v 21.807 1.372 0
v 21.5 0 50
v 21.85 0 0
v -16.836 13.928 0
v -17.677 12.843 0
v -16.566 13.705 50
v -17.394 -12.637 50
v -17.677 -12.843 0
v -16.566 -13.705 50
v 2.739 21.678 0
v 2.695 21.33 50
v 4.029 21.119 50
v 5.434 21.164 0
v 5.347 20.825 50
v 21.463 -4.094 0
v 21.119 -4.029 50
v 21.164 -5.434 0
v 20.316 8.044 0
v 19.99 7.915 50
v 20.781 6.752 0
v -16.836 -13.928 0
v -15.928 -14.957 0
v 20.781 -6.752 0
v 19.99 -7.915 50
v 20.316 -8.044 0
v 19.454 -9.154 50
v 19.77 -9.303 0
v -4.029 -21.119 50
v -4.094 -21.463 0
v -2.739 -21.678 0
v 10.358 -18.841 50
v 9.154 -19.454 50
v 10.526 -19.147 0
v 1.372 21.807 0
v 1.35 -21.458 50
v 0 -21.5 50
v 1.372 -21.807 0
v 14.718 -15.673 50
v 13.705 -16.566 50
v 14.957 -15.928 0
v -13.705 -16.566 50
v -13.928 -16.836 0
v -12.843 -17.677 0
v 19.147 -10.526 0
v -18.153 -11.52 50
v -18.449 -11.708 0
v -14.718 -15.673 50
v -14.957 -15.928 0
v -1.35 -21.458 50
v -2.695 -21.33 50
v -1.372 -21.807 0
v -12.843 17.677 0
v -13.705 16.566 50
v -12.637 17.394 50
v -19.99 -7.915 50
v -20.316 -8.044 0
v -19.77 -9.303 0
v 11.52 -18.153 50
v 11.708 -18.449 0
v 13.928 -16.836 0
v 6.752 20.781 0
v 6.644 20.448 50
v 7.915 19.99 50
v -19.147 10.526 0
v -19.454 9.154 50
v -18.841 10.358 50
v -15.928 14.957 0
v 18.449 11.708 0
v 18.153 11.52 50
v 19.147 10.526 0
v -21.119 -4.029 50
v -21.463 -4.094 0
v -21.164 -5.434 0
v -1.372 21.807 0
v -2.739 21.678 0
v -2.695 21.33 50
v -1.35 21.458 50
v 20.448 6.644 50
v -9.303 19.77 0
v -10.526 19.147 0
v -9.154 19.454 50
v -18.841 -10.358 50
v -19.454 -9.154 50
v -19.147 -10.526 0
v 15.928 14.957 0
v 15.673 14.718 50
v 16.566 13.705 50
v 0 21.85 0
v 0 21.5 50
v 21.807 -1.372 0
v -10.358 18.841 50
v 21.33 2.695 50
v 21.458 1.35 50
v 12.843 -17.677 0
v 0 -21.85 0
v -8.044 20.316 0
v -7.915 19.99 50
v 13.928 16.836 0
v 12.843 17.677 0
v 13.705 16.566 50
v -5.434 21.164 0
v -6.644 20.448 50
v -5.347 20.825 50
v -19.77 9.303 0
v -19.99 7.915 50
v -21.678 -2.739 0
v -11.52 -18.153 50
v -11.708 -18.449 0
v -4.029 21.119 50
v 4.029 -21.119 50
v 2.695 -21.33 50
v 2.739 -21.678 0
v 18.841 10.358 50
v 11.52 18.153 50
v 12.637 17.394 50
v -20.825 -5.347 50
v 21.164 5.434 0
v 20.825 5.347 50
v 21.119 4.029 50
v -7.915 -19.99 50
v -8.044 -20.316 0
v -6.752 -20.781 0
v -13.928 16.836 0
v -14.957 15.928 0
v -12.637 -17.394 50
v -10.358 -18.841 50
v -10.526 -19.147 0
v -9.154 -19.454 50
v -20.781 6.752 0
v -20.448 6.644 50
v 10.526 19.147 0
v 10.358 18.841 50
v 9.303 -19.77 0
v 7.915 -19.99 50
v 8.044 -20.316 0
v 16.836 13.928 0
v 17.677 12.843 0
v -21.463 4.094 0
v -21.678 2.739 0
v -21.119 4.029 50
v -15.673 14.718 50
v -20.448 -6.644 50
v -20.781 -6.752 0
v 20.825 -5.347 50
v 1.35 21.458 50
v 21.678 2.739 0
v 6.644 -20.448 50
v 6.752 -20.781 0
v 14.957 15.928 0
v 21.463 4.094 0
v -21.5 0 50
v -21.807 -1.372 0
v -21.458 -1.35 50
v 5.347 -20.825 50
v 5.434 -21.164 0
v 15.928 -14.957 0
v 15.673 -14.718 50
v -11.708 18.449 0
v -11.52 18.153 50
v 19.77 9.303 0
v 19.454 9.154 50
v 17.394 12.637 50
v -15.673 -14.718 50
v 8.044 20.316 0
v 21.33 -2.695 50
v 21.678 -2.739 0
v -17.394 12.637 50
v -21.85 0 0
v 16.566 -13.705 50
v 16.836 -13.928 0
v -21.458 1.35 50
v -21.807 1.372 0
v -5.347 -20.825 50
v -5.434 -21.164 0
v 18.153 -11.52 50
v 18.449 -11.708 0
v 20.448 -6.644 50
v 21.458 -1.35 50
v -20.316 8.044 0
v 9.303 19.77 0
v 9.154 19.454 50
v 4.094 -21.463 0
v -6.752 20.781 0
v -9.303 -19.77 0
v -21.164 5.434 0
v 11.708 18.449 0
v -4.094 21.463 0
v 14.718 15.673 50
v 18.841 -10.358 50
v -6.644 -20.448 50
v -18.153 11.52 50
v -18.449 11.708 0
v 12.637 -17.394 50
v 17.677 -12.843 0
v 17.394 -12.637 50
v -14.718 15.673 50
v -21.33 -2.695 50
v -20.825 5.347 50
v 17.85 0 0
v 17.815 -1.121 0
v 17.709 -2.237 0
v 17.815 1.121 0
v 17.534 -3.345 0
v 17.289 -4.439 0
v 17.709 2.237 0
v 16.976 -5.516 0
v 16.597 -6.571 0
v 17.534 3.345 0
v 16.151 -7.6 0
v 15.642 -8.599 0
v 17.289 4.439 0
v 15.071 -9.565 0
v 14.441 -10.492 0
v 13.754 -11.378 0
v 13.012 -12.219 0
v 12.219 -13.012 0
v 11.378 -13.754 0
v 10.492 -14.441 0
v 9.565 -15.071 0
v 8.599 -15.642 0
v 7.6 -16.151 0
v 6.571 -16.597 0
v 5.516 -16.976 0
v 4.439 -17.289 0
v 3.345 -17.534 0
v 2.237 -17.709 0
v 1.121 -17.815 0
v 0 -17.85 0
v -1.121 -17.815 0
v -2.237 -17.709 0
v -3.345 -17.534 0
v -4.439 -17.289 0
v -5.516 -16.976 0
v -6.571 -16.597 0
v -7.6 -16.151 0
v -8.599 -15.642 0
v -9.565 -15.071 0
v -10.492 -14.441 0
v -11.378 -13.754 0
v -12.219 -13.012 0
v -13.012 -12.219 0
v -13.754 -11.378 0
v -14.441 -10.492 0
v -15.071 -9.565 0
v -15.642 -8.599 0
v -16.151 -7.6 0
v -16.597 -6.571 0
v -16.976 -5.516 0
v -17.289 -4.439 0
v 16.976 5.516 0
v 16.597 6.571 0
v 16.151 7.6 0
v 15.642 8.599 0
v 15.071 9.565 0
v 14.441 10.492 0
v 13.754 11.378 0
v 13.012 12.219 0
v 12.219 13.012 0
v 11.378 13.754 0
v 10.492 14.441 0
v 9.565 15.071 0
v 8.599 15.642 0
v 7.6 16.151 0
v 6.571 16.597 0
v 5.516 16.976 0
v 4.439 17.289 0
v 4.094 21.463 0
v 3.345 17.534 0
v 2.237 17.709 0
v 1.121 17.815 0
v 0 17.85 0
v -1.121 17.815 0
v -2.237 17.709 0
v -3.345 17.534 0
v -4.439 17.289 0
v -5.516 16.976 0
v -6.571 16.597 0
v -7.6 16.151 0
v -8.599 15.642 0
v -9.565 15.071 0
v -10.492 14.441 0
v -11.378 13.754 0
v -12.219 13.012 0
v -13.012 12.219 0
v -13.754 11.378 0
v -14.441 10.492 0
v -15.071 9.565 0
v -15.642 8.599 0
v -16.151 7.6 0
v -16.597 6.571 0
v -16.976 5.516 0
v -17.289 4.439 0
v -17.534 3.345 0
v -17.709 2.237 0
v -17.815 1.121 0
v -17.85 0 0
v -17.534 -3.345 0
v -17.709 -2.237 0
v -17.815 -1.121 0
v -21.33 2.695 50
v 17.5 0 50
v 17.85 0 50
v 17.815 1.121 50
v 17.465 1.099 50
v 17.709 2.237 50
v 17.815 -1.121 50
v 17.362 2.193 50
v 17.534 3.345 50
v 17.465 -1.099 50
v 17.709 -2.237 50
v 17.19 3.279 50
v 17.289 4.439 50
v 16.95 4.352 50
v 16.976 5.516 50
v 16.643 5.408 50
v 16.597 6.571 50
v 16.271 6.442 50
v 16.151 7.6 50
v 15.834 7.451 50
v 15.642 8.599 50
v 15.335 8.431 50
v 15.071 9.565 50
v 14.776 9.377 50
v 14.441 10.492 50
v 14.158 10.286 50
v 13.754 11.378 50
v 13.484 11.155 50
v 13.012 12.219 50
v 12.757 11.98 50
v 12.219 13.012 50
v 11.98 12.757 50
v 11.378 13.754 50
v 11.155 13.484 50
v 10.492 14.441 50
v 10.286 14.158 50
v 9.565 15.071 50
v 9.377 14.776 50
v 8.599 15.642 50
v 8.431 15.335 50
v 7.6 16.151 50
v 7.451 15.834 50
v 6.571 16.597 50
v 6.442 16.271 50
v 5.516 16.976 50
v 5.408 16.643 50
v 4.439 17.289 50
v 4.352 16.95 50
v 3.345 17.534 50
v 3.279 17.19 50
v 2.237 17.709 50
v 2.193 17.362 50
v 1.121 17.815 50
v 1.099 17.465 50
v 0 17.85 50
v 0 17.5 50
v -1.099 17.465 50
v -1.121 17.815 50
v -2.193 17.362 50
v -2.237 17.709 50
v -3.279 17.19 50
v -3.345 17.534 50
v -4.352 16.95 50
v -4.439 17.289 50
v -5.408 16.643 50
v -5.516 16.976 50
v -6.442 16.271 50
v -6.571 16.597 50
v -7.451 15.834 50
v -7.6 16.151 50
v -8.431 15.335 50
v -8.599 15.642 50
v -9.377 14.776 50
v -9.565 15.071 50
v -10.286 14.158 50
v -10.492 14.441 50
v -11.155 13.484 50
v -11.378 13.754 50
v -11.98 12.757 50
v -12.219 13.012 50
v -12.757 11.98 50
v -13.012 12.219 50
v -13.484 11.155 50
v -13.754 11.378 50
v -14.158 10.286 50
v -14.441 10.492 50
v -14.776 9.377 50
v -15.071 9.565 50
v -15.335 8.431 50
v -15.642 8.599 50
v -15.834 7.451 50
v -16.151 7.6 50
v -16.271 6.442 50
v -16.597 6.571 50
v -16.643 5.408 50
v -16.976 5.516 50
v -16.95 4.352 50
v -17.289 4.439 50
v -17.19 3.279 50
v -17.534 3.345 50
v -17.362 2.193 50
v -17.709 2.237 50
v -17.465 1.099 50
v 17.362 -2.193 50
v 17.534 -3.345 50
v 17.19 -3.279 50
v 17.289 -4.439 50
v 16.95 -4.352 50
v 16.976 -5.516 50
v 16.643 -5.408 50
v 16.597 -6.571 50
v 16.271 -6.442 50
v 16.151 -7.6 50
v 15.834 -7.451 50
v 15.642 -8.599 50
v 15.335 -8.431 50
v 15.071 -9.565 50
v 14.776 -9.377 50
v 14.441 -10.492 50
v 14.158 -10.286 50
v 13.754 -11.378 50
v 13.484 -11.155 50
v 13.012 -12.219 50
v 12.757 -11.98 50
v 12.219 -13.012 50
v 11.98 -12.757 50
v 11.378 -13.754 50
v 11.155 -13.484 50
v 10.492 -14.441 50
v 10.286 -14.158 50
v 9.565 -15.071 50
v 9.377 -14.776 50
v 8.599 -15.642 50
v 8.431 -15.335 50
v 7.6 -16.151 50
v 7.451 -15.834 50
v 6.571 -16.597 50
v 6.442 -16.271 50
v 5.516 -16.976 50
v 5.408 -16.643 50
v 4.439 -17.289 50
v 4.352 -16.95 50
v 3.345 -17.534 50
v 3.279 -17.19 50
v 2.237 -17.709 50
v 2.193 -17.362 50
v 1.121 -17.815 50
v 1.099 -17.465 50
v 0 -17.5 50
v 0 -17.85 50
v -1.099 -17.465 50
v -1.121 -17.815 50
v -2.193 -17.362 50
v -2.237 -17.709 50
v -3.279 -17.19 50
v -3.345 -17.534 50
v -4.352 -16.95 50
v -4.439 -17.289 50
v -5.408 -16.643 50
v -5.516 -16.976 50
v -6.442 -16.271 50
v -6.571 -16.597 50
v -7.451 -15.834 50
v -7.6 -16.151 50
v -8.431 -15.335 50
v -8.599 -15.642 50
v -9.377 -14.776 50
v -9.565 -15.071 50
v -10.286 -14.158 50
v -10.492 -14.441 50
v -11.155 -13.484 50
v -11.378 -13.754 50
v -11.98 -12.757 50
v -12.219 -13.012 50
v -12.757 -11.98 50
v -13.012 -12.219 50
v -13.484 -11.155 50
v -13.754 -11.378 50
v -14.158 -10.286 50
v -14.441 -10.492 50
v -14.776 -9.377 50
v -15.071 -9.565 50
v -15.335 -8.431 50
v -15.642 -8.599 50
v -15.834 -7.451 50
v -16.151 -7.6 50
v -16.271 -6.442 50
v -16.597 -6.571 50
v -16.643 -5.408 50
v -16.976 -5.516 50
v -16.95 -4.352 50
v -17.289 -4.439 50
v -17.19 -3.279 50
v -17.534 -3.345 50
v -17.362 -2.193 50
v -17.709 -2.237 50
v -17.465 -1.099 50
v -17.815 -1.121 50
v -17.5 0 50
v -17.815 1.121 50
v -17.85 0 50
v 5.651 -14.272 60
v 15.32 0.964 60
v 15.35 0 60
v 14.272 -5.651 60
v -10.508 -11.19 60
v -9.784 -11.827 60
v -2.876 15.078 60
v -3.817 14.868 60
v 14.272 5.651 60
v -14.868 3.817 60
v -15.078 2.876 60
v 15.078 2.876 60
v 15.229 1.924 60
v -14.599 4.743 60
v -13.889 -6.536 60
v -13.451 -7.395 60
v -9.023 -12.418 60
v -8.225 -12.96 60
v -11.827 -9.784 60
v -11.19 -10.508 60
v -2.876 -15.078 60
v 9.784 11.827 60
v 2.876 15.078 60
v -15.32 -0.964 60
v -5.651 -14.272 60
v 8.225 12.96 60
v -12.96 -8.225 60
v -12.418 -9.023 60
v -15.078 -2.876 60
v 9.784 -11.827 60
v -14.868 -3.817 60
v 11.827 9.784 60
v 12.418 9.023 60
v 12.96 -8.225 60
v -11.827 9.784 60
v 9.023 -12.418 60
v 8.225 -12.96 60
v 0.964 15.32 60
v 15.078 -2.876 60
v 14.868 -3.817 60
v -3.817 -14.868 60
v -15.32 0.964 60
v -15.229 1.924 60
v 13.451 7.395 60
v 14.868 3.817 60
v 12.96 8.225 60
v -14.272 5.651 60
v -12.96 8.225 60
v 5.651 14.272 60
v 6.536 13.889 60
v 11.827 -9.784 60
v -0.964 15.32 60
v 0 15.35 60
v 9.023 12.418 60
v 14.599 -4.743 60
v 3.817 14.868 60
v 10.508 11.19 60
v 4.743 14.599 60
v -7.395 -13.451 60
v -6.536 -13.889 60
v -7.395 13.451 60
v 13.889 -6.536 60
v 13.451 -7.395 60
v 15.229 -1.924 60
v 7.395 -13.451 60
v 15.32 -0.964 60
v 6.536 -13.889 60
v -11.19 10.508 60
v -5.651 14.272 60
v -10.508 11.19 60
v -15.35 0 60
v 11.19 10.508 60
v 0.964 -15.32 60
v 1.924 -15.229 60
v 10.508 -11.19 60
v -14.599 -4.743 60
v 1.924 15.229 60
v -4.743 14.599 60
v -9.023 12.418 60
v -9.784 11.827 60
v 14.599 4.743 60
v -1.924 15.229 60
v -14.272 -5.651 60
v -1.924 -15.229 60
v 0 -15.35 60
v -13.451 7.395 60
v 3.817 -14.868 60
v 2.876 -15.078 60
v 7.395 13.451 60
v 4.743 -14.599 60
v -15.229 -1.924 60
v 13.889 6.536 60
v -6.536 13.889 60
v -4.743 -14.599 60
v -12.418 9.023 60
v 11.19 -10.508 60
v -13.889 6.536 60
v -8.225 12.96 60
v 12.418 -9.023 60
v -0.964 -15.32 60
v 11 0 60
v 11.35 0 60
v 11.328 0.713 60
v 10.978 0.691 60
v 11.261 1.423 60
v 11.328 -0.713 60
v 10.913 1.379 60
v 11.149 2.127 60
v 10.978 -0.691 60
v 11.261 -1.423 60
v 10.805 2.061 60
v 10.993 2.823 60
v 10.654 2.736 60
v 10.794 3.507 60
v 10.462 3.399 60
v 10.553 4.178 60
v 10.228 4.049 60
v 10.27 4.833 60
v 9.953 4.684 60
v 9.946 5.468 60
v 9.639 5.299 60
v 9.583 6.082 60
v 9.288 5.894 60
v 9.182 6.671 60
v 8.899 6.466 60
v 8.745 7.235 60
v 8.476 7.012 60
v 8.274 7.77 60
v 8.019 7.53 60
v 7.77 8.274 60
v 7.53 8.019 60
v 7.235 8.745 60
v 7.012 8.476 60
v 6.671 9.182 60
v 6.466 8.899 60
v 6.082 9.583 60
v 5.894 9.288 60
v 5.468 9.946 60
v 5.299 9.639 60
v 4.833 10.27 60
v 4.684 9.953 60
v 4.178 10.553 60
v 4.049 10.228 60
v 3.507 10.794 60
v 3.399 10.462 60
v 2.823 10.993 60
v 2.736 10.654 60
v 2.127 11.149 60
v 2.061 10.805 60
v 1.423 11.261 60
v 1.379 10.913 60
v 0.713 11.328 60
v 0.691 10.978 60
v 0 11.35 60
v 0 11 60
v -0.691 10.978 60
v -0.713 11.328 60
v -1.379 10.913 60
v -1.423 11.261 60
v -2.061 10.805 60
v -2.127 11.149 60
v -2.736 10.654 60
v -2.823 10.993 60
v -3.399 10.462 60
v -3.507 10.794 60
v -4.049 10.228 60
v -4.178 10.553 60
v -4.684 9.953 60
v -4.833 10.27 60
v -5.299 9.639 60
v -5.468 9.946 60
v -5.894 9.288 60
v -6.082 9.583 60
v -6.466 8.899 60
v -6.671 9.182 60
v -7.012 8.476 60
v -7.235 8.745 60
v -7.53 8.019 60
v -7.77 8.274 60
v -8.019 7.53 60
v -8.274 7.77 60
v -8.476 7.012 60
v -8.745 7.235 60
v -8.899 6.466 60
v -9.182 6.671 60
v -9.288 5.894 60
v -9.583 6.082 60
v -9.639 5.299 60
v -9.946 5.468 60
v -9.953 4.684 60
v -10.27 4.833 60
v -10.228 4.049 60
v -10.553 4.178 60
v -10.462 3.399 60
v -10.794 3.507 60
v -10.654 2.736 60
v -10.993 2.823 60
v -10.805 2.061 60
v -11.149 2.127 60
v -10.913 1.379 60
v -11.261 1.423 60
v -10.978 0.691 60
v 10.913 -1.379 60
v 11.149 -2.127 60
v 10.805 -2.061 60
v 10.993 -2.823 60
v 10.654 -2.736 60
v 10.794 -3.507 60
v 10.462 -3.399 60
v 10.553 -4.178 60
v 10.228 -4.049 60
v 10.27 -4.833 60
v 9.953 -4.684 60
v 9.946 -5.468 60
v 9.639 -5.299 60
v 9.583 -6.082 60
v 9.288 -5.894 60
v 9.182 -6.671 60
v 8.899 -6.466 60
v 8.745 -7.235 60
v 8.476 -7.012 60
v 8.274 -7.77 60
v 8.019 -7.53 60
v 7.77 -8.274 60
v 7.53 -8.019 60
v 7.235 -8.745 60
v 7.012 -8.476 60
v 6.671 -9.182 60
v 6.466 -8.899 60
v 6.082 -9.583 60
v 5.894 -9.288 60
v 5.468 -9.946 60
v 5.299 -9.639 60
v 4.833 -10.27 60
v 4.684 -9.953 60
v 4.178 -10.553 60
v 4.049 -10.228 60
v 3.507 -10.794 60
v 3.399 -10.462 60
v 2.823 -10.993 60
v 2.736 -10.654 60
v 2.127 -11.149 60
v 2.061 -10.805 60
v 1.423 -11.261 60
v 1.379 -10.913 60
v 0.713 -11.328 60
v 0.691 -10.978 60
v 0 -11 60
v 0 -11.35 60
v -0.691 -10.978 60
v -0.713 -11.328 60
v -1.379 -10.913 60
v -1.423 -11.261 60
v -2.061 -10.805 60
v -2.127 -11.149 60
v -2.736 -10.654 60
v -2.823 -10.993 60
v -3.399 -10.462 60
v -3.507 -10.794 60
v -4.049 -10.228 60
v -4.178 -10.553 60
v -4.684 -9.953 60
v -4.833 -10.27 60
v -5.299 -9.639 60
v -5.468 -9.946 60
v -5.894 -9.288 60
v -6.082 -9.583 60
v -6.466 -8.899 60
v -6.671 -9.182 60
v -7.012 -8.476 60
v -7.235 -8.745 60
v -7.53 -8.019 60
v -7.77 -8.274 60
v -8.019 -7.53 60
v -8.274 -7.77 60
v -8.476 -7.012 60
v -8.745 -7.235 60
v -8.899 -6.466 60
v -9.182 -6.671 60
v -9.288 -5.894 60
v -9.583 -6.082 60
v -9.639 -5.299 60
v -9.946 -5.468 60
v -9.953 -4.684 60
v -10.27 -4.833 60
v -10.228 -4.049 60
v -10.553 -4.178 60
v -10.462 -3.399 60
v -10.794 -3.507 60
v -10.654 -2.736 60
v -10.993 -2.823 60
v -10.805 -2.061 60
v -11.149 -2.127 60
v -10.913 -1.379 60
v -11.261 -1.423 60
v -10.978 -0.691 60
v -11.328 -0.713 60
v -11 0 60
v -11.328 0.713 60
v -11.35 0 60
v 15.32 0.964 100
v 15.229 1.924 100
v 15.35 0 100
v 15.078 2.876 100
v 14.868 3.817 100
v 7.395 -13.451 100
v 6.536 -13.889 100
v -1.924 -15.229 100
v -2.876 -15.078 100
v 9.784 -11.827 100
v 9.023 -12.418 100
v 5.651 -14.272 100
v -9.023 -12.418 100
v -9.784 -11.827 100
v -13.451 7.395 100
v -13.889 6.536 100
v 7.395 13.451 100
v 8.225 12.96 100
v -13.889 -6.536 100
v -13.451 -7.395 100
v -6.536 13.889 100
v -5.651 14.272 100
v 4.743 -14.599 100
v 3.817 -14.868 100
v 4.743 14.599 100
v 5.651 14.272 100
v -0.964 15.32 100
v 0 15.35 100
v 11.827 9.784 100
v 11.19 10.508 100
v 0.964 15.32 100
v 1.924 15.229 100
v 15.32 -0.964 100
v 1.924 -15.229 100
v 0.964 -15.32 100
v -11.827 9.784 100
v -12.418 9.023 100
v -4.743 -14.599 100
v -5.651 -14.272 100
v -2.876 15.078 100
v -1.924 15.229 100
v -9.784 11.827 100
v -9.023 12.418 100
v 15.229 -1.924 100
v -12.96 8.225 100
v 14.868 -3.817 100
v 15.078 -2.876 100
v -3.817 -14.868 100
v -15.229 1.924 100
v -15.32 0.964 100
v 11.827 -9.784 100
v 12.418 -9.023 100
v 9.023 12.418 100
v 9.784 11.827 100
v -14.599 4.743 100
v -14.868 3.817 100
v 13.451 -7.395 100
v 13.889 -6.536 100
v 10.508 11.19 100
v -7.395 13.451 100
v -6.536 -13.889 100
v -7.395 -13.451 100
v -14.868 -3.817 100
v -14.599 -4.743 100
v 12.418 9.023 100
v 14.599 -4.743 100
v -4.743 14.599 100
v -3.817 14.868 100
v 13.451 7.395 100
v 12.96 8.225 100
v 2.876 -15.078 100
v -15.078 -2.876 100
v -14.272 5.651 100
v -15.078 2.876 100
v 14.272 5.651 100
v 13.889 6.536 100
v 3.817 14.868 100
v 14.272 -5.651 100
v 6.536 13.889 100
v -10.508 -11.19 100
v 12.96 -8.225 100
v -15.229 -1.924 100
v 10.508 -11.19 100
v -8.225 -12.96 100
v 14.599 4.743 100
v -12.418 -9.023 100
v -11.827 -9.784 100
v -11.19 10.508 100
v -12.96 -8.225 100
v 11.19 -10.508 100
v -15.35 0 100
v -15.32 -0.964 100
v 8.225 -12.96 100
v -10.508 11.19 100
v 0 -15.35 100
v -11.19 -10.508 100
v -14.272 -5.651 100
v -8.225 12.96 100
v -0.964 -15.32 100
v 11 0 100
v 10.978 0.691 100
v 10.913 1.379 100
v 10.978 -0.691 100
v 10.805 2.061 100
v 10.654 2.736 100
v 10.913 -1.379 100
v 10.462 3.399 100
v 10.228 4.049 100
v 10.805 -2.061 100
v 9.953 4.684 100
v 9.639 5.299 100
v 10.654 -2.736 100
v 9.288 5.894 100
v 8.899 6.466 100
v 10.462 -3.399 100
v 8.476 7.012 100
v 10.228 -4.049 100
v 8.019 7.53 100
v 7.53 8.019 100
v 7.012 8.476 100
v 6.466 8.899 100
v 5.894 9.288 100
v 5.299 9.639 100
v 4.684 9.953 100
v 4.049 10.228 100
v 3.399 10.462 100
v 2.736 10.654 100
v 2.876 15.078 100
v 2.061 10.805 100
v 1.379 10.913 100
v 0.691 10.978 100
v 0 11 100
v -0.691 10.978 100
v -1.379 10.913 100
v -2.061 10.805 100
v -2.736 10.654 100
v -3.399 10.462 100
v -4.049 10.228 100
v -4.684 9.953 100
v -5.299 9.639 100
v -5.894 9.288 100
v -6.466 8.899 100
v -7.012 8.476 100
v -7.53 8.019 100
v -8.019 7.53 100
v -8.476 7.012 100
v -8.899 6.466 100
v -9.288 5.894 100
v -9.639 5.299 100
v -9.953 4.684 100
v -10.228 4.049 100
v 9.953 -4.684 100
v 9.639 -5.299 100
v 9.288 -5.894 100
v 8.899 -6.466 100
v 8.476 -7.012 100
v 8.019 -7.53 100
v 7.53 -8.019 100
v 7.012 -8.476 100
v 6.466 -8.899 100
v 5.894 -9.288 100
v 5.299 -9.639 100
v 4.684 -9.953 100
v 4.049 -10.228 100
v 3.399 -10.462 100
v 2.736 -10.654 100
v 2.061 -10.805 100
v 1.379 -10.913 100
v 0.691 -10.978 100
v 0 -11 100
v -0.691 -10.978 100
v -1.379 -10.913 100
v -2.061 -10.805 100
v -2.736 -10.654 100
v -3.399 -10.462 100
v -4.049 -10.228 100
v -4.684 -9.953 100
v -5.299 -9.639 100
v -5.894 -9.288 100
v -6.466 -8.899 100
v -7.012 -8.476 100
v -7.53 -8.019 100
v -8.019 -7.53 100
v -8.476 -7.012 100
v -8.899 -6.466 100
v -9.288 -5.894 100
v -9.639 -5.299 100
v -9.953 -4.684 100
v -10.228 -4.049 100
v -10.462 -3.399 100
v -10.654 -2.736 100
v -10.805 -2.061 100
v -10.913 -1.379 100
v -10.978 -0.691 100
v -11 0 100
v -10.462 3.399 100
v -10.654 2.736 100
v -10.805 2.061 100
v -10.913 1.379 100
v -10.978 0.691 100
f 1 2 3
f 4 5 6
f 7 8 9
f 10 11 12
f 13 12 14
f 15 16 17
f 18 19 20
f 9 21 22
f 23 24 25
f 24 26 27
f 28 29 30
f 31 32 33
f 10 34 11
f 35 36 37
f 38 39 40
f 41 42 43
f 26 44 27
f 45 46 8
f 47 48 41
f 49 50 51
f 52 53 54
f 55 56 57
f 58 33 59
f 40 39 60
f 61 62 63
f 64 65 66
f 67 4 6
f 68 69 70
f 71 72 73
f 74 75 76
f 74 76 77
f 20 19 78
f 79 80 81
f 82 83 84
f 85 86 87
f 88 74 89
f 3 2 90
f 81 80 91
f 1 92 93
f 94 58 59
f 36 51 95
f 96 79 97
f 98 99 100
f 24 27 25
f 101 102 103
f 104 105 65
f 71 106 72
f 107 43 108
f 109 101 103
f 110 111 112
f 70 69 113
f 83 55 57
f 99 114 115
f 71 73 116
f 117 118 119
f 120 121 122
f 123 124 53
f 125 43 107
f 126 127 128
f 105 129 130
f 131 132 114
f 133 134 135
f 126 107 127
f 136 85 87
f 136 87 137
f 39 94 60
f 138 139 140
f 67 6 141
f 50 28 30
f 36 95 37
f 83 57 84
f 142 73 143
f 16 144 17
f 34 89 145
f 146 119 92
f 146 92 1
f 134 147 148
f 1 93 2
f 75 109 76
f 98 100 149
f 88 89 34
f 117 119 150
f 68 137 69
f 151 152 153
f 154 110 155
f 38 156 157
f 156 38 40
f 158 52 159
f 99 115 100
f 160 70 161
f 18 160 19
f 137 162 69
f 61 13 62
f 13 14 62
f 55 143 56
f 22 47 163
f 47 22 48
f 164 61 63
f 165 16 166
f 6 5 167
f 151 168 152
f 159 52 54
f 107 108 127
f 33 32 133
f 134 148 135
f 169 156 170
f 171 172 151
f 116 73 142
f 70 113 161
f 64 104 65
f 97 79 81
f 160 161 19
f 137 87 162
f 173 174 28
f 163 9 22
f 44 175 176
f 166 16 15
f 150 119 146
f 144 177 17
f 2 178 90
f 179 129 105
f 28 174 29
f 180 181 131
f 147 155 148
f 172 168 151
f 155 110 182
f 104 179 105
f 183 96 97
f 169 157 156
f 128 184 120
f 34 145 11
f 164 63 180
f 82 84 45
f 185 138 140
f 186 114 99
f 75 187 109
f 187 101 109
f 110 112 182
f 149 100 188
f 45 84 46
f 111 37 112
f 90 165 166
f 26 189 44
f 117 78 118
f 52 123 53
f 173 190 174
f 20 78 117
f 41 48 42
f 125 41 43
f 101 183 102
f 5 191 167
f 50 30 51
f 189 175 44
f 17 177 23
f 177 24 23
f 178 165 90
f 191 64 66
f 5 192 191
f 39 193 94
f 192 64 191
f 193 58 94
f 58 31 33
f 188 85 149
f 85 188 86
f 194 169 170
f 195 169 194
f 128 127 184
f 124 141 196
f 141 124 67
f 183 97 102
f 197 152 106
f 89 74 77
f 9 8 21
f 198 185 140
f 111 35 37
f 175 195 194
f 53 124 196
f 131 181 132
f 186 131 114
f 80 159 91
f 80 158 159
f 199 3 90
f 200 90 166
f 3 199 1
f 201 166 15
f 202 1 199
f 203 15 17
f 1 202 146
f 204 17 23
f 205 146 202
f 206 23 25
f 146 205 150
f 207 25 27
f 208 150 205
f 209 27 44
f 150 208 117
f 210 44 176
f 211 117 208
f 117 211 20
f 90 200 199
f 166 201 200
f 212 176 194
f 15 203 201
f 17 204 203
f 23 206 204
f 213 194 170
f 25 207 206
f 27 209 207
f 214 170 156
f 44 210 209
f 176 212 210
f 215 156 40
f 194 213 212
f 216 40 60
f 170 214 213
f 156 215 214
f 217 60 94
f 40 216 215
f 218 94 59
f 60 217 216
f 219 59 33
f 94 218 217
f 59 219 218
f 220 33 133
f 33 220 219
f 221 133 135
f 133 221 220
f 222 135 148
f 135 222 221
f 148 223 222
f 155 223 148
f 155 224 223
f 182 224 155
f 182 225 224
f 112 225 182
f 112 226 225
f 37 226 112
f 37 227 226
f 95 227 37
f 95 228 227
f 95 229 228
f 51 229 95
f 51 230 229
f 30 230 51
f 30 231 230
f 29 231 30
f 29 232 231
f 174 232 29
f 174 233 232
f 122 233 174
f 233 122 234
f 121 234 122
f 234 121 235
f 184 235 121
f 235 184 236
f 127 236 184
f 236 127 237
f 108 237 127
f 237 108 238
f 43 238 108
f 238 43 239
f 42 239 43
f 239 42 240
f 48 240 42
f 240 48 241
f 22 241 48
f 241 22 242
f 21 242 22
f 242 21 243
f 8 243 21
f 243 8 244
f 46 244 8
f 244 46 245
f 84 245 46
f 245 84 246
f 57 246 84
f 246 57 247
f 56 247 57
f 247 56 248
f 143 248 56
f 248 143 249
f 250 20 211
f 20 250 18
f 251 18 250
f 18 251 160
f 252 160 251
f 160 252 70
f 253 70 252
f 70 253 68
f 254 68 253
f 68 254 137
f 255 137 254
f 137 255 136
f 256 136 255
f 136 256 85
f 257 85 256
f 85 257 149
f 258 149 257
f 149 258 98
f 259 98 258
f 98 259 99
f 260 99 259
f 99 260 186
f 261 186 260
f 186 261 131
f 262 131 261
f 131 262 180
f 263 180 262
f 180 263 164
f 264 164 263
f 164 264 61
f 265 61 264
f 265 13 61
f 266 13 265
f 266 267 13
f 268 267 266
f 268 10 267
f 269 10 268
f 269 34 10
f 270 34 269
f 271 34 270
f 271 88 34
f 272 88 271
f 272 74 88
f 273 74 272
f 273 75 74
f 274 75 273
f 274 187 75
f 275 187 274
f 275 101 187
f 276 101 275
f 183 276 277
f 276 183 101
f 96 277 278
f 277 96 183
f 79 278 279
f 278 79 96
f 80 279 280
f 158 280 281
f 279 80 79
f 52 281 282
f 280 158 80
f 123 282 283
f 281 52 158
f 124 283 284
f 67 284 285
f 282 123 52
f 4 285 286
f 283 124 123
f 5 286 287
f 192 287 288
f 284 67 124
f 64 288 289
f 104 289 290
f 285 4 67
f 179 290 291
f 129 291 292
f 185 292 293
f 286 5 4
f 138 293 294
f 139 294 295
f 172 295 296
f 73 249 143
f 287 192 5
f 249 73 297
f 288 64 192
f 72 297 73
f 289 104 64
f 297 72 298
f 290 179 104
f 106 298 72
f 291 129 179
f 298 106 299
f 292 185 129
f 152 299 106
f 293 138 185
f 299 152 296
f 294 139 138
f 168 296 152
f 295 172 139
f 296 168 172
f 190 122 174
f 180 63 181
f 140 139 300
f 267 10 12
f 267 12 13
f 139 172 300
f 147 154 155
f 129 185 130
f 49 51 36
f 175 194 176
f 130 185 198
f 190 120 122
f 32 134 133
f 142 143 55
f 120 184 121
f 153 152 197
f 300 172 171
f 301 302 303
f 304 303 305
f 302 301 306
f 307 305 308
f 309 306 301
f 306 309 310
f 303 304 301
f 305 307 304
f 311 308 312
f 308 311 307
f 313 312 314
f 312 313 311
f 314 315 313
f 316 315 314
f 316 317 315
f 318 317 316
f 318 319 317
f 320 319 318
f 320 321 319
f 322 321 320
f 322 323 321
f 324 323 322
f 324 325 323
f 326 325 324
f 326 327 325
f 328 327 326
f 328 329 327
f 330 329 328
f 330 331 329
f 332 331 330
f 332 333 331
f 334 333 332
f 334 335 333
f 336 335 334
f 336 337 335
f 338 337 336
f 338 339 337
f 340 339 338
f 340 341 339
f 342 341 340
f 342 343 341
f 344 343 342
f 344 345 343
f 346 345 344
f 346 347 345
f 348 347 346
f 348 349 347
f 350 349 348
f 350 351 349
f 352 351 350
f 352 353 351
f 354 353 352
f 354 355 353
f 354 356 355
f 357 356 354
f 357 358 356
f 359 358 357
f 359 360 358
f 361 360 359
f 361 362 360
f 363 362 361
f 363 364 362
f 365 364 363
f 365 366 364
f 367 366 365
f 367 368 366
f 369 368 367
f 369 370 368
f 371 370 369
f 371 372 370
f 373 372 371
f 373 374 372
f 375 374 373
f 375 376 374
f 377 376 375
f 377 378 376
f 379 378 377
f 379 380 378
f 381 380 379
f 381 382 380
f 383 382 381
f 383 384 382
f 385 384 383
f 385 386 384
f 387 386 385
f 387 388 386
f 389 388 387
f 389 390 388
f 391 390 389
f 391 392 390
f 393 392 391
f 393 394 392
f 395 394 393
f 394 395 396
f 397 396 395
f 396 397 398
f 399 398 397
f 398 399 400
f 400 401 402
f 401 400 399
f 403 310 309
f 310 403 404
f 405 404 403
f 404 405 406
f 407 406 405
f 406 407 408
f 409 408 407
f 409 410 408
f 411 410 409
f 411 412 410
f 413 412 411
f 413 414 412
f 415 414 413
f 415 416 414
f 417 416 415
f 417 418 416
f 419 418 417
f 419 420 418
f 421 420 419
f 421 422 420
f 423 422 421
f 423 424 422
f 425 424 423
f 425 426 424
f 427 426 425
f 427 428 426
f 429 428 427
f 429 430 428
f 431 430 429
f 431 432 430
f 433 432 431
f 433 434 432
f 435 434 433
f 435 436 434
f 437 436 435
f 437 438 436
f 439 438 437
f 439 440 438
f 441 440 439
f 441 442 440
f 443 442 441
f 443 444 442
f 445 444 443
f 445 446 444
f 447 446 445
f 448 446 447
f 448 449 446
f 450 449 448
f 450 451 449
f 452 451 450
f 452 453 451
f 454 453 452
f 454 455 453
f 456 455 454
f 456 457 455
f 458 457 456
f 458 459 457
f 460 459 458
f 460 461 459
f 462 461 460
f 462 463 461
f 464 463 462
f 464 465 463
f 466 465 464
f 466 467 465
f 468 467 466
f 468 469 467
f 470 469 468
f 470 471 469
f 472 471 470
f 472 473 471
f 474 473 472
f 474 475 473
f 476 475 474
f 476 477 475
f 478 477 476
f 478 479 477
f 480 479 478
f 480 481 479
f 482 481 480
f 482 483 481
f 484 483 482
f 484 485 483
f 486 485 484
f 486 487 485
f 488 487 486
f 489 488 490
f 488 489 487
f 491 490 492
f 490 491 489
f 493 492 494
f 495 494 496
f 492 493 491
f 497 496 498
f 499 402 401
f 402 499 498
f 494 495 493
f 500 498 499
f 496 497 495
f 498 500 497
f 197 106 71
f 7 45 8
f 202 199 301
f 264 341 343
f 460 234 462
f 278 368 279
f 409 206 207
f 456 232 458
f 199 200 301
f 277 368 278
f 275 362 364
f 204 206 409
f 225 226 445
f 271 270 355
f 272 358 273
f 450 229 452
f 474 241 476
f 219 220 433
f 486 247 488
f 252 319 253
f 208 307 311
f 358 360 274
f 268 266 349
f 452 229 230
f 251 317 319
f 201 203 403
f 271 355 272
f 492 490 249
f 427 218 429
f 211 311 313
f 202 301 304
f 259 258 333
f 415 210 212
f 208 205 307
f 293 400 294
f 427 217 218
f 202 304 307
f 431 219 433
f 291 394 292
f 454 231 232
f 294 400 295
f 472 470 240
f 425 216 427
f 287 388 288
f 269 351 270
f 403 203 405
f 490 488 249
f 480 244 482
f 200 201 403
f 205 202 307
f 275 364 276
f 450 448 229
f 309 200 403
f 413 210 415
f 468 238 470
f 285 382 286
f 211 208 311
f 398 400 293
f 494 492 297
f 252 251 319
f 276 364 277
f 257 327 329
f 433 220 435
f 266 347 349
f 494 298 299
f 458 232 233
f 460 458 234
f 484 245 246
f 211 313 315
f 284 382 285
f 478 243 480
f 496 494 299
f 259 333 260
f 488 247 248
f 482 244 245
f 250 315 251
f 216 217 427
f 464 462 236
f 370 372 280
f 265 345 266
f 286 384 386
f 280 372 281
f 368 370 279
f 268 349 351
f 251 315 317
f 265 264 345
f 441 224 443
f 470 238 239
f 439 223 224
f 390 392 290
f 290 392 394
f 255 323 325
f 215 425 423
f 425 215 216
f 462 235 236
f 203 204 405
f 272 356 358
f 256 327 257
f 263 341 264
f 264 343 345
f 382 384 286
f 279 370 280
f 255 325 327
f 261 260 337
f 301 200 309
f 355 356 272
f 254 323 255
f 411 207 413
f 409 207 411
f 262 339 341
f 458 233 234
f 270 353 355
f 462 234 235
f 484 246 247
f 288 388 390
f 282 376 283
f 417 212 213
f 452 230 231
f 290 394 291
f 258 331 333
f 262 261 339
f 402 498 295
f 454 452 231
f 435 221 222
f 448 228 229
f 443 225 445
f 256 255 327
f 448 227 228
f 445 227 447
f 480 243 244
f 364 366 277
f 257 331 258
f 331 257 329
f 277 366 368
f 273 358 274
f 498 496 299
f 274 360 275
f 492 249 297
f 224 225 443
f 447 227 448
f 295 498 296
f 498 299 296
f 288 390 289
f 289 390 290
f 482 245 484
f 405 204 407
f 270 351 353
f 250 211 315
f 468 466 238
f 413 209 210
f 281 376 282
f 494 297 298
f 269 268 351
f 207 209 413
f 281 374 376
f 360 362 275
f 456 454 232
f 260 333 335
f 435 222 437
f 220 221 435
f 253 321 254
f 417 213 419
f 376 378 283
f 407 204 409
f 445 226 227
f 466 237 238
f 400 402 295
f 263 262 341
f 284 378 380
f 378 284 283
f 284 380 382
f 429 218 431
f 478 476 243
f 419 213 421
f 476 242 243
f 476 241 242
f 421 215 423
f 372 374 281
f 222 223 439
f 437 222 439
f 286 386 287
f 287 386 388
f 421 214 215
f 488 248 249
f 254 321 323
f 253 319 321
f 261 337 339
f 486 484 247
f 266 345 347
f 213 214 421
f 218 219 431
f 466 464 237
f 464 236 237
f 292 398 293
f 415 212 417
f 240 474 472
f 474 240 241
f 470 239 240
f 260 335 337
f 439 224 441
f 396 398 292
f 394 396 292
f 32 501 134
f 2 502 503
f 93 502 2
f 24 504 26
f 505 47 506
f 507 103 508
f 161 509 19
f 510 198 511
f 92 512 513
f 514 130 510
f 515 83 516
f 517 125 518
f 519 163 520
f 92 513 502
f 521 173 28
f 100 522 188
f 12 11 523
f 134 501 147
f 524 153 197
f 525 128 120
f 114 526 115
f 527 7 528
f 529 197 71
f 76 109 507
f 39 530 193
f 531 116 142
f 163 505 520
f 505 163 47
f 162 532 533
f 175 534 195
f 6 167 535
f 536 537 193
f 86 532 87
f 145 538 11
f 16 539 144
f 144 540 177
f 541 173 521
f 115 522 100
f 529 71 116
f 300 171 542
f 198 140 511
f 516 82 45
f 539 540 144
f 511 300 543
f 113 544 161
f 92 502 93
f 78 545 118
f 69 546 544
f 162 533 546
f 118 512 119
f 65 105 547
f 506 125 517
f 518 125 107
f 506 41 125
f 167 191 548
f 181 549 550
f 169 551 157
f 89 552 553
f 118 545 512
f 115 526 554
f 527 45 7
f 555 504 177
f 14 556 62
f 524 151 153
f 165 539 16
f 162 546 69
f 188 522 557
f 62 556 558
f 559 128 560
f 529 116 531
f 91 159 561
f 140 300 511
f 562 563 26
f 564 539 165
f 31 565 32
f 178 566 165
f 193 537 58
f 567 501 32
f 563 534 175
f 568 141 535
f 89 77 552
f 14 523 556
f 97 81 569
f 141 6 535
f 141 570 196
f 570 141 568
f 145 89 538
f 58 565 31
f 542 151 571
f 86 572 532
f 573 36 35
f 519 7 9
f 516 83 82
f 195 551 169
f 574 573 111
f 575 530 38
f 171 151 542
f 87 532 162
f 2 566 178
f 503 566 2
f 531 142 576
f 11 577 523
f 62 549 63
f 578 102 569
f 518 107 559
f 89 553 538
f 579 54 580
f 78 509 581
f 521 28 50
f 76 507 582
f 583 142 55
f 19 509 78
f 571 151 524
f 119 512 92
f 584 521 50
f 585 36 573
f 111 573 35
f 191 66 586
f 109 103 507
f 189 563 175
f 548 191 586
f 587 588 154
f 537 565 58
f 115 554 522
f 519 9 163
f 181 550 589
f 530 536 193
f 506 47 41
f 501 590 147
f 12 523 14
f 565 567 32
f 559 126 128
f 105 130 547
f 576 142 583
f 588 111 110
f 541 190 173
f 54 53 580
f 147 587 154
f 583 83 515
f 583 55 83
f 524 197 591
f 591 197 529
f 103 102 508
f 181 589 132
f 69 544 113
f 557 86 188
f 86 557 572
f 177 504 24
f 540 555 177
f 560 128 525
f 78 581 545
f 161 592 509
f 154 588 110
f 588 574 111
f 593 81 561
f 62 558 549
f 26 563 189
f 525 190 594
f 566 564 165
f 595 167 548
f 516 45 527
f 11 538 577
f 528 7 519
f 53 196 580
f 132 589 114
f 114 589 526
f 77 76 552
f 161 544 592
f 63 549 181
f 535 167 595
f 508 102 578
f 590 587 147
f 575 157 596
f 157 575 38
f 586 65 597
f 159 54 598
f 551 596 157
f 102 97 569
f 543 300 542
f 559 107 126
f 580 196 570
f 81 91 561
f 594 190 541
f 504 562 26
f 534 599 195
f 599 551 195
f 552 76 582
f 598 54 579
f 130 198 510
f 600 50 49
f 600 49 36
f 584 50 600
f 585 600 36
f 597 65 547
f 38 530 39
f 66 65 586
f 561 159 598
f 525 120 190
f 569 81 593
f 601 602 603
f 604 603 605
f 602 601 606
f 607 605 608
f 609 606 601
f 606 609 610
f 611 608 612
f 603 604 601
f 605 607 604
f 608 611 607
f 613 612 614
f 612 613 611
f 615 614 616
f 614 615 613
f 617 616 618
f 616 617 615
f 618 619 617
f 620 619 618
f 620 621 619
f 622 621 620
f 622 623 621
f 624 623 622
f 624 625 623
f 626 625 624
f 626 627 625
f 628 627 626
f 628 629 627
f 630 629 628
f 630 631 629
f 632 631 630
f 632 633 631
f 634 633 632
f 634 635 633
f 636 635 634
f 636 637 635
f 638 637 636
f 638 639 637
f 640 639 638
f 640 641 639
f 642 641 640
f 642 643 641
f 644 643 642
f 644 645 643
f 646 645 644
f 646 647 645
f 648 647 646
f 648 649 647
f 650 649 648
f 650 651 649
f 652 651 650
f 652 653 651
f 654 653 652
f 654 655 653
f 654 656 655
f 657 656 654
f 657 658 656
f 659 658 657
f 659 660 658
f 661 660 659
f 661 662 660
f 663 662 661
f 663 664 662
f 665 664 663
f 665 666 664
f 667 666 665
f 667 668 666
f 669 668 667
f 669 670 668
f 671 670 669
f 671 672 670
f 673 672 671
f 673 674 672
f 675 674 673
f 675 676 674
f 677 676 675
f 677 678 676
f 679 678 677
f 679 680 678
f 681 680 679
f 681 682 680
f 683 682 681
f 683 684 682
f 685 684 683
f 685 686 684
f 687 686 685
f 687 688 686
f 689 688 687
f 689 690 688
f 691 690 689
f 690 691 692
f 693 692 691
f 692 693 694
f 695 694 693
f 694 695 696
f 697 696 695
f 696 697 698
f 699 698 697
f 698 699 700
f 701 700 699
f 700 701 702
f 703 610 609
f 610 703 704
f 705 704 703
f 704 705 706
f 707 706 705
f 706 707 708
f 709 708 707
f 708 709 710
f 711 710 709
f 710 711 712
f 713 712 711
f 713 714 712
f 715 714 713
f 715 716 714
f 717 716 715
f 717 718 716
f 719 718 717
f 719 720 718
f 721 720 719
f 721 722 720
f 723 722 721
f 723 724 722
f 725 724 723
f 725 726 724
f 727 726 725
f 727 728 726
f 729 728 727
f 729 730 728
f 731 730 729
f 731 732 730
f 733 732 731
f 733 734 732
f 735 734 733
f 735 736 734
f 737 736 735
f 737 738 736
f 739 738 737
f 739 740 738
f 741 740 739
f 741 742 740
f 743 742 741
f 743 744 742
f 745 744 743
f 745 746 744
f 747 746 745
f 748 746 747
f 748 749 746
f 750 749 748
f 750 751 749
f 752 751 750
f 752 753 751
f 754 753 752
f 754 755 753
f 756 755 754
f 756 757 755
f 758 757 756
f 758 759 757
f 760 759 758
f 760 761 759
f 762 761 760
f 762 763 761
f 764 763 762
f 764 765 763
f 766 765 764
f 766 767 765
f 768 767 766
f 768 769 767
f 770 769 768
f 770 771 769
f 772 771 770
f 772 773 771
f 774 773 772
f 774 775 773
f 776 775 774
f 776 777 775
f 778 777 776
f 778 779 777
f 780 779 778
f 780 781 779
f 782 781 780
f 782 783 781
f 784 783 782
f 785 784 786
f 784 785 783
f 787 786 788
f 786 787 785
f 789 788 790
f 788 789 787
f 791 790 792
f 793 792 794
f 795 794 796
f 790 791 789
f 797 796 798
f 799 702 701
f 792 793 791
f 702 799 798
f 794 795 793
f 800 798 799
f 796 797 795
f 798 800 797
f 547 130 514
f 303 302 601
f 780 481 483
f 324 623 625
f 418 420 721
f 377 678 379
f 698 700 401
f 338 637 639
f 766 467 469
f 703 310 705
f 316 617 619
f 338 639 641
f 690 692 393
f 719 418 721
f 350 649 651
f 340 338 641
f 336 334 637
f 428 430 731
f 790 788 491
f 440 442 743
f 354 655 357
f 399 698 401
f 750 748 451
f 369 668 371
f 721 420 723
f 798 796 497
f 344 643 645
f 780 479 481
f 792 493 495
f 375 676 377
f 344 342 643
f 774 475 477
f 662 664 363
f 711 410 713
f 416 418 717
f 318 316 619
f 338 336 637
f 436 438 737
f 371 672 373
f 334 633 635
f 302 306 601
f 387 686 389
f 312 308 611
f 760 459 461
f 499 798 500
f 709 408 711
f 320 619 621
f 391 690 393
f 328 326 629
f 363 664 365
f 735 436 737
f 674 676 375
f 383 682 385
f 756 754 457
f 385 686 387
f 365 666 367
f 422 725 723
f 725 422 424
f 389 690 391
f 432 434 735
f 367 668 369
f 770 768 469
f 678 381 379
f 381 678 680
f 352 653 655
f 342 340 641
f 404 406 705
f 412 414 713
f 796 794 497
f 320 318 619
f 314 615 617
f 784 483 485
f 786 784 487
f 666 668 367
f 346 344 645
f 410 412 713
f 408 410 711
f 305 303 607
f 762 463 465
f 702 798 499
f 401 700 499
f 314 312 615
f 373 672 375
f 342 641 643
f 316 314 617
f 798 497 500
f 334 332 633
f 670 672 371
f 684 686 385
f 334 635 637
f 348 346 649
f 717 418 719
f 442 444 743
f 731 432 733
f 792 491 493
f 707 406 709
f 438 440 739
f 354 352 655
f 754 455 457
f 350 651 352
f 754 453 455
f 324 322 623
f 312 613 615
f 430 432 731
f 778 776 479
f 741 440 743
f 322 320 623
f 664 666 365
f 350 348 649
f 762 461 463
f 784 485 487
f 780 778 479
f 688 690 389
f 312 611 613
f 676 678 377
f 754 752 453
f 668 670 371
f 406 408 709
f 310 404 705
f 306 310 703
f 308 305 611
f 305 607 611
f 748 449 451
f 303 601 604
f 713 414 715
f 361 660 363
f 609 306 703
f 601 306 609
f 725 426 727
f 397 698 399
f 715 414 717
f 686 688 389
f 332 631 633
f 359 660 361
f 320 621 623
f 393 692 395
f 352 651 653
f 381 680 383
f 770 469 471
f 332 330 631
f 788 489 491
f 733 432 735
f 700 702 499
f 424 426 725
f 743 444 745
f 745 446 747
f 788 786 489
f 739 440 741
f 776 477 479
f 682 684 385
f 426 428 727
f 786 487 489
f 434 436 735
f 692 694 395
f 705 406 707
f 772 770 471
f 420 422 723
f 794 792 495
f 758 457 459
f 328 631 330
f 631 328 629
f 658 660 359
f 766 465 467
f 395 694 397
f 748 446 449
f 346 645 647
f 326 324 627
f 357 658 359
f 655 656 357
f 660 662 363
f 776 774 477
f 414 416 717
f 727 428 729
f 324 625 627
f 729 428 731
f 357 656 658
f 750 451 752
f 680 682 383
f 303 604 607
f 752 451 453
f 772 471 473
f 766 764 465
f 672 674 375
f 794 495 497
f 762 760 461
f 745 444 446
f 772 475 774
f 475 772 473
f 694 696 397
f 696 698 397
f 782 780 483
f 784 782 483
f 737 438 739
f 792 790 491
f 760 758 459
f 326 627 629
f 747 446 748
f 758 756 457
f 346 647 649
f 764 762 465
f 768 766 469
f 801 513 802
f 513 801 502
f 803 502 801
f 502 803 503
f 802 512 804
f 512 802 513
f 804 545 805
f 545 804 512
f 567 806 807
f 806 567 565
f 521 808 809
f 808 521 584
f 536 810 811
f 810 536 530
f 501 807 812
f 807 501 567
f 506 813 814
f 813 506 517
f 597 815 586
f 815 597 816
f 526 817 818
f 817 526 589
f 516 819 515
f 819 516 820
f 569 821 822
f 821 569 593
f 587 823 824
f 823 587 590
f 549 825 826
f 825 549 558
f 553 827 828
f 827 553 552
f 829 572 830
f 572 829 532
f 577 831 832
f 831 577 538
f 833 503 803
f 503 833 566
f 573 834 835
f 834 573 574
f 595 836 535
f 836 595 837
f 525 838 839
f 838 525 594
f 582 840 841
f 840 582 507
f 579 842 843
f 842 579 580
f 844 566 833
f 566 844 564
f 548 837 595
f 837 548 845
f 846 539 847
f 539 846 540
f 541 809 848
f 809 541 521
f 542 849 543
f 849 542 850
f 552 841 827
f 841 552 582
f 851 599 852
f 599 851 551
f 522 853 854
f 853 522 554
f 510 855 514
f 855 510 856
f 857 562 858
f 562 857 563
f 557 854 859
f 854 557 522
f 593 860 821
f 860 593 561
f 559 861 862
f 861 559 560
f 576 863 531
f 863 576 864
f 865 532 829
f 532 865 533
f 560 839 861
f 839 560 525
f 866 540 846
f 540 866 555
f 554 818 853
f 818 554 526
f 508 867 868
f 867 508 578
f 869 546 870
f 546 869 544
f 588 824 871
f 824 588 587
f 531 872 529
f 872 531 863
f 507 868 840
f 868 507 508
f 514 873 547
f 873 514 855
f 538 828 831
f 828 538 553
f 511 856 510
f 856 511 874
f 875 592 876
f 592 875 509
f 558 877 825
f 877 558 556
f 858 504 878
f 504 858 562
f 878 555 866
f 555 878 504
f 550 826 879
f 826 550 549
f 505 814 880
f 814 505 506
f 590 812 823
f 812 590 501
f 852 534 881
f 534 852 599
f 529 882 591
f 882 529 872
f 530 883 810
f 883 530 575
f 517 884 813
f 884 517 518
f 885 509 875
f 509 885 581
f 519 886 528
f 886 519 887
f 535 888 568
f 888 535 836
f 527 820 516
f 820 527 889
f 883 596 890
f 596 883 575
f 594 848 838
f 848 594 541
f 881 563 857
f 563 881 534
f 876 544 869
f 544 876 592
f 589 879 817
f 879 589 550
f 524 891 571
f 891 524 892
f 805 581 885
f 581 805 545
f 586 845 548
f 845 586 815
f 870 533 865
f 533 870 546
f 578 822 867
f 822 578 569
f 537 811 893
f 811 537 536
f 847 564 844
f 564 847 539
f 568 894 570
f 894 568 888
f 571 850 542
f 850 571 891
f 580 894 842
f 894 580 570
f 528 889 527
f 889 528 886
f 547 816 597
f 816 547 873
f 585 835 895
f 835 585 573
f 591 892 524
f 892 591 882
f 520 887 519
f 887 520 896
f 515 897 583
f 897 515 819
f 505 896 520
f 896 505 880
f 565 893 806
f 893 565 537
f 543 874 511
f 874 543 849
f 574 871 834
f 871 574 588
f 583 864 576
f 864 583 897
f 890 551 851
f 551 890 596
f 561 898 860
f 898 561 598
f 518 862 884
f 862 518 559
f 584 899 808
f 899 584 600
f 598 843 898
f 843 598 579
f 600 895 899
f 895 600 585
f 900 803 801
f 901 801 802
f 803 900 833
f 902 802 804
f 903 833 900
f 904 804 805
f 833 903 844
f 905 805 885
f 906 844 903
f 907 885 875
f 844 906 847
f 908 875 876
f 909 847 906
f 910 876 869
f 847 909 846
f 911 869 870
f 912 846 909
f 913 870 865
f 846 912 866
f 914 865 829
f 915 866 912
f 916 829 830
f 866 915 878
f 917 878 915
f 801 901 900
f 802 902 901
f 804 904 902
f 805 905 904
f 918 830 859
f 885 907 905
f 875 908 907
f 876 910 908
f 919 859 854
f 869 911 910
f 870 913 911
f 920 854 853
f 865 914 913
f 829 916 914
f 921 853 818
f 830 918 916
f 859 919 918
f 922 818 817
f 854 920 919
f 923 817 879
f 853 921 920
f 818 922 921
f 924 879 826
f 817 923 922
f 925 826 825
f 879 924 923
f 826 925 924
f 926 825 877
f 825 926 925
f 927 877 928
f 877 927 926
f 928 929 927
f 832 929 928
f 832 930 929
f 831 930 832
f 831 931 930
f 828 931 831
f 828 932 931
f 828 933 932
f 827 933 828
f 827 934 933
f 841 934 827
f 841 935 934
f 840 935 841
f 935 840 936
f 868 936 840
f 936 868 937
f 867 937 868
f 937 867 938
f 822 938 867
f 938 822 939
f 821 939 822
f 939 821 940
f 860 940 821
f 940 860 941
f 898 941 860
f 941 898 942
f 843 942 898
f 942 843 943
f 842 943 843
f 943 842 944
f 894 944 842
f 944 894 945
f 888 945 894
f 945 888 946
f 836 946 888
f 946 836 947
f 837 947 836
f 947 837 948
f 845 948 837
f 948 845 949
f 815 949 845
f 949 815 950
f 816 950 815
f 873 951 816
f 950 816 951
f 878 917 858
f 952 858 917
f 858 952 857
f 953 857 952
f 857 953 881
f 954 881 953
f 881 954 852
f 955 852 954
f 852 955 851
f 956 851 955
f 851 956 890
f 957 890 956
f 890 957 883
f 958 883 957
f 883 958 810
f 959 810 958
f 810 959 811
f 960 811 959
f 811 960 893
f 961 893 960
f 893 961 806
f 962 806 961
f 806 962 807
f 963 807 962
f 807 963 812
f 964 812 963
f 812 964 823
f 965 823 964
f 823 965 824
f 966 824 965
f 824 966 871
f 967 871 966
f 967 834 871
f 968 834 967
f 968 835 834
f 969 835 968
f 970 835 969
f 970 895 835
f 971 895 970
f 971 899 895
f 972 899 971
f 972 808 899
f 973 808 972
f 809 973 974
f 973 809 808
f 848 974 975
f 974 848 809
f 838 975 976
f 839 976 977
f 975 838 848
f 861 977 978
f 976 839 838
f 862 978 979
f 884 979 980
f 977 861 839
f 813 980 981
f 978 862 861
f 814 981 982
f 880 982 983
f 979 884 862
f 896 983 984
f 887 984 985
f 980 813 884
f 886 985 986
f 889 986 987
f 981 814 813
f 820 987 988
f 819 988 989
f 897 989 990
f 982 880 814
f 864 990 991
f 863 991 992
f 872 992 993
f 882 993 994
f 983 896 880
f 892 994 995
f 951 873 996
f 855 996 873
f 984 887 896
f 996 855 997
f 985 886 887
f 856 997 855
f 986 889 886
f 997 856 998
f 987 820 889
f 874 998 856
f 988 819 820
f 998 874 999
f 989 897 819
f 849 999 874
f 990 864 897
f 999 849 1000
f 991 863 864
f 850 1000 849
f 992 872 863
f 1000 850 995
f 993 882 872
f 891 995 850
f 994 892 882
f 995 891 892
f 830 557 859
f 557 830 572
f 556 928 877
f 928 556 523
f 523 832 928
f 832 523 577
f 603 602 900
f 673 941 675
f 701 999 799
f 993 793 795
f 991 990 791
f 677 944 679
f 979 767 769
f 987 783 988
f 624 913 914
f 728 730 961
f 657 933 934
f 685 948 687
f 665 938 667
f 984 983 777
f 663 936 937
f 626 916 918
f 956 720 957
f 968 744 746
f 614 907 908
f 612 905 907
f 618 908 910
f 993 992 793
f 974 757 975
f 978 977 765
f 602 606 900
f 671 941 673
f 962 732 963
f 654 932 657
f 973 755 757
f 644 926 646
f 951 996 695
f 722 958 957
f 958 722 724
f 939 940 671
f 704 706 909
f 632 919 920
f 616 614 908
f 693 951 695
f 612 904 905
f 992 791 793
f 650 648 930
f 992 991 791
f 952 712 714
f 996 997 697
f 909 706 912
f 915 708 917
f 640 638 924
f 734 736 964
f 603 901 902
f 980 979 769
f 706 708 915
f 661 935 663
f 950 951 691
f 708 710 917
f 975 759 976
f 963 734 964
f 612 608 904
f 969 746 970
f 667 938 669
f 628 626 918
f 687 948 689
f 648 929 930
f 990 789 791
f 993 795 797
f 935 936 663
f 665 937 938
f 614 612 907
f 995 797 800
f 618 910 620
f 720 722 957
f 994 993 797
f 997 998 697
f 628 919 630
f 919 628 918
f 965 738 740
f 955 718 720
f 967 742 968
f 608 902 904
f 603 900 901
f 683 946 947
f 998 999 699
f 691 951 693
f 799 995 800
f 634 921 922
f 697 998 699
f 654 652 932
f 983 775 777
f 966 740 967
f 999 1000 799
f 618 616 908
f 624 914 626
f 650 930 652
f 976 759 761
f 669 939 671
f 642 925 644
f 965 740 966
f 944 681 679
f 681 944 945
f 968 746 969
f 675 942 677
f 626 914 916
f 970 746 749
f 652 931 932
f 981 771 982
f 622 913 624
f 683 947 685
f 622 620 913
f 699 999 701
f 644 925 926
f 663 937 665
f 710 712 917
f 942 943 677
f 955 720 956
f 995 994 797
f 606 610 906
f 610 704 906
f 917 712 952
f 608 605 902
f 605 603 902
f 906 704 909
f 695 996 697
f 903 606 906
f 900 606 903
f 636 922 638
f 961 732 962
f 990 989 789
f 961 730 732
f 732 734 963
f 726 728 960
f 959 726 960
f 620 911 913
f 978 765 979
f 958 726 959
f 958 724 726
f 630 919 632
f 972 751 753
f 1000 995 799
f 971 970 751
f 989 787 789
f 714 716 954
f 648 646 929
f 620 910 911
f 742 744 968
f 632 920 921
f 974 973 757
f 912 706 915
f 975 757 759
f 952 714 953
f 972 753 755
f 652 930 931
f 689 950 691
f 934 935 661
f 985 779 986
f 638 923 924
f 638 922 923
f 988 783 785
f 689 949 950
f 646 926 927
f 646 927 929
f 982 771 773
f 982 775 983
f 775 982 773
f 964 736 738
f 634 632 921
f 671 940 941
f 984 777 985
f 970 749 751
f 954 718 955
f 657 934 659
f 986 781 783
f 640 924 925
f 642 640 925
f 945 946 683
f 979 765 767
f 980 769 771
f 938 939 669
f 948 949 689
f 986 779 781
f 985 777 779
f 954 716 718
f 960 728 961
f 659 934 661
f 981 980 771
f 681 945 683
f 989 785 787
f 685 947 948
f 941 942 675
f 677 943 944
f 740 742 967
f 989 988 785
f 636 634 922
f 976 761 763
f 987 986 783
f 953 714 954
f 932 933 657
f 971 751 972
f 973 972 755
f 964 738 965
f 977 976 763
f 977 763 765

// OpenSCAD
VACUUM_CLEANER_DIAMETER = 35;
VACUUM_CLEANER_LENGTH=50;
SANDER_DIAMETER = 22;
SANDER_LENGTH=40;

THICKNESS = 4;
CONE_OFFSET = 0.7;
CONE_LENGTH=10;

$fn = 100;

difference ()  {
cylinder(d1 = VACUUM_CLEANER_DIAMETER + CONE_OFFSET + THICKNESS * 2, d2 = VACUUM_CLEANER_DIAMETER  + THICKNESS * 2, h = VACUUM_CLEANER_LENGTH);
cylinder(d1 = VACUUM_CLEANER_DIAMETER + CONE_OFFSET, d2 = VACUUM_CLEANER_DIAMETER, h = VACUUM_CLEANER_LENGTH);
}

translate([0, 0, VACUUM_CLEANER_LENGTH])
difference ()  {
cylinder(d1 = VACUUM_CLEANER_DIAMETER  + THICKNESS * 2, d2 = SANDER_DIAMETER   + CONE_OFFSET + THICKNESS * 2, h = CONE_LENGTH);
cylinder(d1 = VACUUM_CLEANER_DIAMETER + CONE_OFFSET, d2 = SANDER_DIAMETER , h = CONE_LENGTH);
}

translate([0, 0, VACUUM_CLEANER_LENGTH + CONE_LENGTH])
difference ()  {
cylinder(d1 = SANDER_DIAMETER + CONE_OFFSET + THICKNESS * 2, d2 = SANDER_DIAMETER   + CONE_OFFSET + THICKNESS * 2, h = SANDER_LENGTH);
cylinder(d1 = SANDER_DIAMETER + CONE_OFFSET, d2 = SANDER_DIAMETER , h = SANDER_LENGTH);
}
